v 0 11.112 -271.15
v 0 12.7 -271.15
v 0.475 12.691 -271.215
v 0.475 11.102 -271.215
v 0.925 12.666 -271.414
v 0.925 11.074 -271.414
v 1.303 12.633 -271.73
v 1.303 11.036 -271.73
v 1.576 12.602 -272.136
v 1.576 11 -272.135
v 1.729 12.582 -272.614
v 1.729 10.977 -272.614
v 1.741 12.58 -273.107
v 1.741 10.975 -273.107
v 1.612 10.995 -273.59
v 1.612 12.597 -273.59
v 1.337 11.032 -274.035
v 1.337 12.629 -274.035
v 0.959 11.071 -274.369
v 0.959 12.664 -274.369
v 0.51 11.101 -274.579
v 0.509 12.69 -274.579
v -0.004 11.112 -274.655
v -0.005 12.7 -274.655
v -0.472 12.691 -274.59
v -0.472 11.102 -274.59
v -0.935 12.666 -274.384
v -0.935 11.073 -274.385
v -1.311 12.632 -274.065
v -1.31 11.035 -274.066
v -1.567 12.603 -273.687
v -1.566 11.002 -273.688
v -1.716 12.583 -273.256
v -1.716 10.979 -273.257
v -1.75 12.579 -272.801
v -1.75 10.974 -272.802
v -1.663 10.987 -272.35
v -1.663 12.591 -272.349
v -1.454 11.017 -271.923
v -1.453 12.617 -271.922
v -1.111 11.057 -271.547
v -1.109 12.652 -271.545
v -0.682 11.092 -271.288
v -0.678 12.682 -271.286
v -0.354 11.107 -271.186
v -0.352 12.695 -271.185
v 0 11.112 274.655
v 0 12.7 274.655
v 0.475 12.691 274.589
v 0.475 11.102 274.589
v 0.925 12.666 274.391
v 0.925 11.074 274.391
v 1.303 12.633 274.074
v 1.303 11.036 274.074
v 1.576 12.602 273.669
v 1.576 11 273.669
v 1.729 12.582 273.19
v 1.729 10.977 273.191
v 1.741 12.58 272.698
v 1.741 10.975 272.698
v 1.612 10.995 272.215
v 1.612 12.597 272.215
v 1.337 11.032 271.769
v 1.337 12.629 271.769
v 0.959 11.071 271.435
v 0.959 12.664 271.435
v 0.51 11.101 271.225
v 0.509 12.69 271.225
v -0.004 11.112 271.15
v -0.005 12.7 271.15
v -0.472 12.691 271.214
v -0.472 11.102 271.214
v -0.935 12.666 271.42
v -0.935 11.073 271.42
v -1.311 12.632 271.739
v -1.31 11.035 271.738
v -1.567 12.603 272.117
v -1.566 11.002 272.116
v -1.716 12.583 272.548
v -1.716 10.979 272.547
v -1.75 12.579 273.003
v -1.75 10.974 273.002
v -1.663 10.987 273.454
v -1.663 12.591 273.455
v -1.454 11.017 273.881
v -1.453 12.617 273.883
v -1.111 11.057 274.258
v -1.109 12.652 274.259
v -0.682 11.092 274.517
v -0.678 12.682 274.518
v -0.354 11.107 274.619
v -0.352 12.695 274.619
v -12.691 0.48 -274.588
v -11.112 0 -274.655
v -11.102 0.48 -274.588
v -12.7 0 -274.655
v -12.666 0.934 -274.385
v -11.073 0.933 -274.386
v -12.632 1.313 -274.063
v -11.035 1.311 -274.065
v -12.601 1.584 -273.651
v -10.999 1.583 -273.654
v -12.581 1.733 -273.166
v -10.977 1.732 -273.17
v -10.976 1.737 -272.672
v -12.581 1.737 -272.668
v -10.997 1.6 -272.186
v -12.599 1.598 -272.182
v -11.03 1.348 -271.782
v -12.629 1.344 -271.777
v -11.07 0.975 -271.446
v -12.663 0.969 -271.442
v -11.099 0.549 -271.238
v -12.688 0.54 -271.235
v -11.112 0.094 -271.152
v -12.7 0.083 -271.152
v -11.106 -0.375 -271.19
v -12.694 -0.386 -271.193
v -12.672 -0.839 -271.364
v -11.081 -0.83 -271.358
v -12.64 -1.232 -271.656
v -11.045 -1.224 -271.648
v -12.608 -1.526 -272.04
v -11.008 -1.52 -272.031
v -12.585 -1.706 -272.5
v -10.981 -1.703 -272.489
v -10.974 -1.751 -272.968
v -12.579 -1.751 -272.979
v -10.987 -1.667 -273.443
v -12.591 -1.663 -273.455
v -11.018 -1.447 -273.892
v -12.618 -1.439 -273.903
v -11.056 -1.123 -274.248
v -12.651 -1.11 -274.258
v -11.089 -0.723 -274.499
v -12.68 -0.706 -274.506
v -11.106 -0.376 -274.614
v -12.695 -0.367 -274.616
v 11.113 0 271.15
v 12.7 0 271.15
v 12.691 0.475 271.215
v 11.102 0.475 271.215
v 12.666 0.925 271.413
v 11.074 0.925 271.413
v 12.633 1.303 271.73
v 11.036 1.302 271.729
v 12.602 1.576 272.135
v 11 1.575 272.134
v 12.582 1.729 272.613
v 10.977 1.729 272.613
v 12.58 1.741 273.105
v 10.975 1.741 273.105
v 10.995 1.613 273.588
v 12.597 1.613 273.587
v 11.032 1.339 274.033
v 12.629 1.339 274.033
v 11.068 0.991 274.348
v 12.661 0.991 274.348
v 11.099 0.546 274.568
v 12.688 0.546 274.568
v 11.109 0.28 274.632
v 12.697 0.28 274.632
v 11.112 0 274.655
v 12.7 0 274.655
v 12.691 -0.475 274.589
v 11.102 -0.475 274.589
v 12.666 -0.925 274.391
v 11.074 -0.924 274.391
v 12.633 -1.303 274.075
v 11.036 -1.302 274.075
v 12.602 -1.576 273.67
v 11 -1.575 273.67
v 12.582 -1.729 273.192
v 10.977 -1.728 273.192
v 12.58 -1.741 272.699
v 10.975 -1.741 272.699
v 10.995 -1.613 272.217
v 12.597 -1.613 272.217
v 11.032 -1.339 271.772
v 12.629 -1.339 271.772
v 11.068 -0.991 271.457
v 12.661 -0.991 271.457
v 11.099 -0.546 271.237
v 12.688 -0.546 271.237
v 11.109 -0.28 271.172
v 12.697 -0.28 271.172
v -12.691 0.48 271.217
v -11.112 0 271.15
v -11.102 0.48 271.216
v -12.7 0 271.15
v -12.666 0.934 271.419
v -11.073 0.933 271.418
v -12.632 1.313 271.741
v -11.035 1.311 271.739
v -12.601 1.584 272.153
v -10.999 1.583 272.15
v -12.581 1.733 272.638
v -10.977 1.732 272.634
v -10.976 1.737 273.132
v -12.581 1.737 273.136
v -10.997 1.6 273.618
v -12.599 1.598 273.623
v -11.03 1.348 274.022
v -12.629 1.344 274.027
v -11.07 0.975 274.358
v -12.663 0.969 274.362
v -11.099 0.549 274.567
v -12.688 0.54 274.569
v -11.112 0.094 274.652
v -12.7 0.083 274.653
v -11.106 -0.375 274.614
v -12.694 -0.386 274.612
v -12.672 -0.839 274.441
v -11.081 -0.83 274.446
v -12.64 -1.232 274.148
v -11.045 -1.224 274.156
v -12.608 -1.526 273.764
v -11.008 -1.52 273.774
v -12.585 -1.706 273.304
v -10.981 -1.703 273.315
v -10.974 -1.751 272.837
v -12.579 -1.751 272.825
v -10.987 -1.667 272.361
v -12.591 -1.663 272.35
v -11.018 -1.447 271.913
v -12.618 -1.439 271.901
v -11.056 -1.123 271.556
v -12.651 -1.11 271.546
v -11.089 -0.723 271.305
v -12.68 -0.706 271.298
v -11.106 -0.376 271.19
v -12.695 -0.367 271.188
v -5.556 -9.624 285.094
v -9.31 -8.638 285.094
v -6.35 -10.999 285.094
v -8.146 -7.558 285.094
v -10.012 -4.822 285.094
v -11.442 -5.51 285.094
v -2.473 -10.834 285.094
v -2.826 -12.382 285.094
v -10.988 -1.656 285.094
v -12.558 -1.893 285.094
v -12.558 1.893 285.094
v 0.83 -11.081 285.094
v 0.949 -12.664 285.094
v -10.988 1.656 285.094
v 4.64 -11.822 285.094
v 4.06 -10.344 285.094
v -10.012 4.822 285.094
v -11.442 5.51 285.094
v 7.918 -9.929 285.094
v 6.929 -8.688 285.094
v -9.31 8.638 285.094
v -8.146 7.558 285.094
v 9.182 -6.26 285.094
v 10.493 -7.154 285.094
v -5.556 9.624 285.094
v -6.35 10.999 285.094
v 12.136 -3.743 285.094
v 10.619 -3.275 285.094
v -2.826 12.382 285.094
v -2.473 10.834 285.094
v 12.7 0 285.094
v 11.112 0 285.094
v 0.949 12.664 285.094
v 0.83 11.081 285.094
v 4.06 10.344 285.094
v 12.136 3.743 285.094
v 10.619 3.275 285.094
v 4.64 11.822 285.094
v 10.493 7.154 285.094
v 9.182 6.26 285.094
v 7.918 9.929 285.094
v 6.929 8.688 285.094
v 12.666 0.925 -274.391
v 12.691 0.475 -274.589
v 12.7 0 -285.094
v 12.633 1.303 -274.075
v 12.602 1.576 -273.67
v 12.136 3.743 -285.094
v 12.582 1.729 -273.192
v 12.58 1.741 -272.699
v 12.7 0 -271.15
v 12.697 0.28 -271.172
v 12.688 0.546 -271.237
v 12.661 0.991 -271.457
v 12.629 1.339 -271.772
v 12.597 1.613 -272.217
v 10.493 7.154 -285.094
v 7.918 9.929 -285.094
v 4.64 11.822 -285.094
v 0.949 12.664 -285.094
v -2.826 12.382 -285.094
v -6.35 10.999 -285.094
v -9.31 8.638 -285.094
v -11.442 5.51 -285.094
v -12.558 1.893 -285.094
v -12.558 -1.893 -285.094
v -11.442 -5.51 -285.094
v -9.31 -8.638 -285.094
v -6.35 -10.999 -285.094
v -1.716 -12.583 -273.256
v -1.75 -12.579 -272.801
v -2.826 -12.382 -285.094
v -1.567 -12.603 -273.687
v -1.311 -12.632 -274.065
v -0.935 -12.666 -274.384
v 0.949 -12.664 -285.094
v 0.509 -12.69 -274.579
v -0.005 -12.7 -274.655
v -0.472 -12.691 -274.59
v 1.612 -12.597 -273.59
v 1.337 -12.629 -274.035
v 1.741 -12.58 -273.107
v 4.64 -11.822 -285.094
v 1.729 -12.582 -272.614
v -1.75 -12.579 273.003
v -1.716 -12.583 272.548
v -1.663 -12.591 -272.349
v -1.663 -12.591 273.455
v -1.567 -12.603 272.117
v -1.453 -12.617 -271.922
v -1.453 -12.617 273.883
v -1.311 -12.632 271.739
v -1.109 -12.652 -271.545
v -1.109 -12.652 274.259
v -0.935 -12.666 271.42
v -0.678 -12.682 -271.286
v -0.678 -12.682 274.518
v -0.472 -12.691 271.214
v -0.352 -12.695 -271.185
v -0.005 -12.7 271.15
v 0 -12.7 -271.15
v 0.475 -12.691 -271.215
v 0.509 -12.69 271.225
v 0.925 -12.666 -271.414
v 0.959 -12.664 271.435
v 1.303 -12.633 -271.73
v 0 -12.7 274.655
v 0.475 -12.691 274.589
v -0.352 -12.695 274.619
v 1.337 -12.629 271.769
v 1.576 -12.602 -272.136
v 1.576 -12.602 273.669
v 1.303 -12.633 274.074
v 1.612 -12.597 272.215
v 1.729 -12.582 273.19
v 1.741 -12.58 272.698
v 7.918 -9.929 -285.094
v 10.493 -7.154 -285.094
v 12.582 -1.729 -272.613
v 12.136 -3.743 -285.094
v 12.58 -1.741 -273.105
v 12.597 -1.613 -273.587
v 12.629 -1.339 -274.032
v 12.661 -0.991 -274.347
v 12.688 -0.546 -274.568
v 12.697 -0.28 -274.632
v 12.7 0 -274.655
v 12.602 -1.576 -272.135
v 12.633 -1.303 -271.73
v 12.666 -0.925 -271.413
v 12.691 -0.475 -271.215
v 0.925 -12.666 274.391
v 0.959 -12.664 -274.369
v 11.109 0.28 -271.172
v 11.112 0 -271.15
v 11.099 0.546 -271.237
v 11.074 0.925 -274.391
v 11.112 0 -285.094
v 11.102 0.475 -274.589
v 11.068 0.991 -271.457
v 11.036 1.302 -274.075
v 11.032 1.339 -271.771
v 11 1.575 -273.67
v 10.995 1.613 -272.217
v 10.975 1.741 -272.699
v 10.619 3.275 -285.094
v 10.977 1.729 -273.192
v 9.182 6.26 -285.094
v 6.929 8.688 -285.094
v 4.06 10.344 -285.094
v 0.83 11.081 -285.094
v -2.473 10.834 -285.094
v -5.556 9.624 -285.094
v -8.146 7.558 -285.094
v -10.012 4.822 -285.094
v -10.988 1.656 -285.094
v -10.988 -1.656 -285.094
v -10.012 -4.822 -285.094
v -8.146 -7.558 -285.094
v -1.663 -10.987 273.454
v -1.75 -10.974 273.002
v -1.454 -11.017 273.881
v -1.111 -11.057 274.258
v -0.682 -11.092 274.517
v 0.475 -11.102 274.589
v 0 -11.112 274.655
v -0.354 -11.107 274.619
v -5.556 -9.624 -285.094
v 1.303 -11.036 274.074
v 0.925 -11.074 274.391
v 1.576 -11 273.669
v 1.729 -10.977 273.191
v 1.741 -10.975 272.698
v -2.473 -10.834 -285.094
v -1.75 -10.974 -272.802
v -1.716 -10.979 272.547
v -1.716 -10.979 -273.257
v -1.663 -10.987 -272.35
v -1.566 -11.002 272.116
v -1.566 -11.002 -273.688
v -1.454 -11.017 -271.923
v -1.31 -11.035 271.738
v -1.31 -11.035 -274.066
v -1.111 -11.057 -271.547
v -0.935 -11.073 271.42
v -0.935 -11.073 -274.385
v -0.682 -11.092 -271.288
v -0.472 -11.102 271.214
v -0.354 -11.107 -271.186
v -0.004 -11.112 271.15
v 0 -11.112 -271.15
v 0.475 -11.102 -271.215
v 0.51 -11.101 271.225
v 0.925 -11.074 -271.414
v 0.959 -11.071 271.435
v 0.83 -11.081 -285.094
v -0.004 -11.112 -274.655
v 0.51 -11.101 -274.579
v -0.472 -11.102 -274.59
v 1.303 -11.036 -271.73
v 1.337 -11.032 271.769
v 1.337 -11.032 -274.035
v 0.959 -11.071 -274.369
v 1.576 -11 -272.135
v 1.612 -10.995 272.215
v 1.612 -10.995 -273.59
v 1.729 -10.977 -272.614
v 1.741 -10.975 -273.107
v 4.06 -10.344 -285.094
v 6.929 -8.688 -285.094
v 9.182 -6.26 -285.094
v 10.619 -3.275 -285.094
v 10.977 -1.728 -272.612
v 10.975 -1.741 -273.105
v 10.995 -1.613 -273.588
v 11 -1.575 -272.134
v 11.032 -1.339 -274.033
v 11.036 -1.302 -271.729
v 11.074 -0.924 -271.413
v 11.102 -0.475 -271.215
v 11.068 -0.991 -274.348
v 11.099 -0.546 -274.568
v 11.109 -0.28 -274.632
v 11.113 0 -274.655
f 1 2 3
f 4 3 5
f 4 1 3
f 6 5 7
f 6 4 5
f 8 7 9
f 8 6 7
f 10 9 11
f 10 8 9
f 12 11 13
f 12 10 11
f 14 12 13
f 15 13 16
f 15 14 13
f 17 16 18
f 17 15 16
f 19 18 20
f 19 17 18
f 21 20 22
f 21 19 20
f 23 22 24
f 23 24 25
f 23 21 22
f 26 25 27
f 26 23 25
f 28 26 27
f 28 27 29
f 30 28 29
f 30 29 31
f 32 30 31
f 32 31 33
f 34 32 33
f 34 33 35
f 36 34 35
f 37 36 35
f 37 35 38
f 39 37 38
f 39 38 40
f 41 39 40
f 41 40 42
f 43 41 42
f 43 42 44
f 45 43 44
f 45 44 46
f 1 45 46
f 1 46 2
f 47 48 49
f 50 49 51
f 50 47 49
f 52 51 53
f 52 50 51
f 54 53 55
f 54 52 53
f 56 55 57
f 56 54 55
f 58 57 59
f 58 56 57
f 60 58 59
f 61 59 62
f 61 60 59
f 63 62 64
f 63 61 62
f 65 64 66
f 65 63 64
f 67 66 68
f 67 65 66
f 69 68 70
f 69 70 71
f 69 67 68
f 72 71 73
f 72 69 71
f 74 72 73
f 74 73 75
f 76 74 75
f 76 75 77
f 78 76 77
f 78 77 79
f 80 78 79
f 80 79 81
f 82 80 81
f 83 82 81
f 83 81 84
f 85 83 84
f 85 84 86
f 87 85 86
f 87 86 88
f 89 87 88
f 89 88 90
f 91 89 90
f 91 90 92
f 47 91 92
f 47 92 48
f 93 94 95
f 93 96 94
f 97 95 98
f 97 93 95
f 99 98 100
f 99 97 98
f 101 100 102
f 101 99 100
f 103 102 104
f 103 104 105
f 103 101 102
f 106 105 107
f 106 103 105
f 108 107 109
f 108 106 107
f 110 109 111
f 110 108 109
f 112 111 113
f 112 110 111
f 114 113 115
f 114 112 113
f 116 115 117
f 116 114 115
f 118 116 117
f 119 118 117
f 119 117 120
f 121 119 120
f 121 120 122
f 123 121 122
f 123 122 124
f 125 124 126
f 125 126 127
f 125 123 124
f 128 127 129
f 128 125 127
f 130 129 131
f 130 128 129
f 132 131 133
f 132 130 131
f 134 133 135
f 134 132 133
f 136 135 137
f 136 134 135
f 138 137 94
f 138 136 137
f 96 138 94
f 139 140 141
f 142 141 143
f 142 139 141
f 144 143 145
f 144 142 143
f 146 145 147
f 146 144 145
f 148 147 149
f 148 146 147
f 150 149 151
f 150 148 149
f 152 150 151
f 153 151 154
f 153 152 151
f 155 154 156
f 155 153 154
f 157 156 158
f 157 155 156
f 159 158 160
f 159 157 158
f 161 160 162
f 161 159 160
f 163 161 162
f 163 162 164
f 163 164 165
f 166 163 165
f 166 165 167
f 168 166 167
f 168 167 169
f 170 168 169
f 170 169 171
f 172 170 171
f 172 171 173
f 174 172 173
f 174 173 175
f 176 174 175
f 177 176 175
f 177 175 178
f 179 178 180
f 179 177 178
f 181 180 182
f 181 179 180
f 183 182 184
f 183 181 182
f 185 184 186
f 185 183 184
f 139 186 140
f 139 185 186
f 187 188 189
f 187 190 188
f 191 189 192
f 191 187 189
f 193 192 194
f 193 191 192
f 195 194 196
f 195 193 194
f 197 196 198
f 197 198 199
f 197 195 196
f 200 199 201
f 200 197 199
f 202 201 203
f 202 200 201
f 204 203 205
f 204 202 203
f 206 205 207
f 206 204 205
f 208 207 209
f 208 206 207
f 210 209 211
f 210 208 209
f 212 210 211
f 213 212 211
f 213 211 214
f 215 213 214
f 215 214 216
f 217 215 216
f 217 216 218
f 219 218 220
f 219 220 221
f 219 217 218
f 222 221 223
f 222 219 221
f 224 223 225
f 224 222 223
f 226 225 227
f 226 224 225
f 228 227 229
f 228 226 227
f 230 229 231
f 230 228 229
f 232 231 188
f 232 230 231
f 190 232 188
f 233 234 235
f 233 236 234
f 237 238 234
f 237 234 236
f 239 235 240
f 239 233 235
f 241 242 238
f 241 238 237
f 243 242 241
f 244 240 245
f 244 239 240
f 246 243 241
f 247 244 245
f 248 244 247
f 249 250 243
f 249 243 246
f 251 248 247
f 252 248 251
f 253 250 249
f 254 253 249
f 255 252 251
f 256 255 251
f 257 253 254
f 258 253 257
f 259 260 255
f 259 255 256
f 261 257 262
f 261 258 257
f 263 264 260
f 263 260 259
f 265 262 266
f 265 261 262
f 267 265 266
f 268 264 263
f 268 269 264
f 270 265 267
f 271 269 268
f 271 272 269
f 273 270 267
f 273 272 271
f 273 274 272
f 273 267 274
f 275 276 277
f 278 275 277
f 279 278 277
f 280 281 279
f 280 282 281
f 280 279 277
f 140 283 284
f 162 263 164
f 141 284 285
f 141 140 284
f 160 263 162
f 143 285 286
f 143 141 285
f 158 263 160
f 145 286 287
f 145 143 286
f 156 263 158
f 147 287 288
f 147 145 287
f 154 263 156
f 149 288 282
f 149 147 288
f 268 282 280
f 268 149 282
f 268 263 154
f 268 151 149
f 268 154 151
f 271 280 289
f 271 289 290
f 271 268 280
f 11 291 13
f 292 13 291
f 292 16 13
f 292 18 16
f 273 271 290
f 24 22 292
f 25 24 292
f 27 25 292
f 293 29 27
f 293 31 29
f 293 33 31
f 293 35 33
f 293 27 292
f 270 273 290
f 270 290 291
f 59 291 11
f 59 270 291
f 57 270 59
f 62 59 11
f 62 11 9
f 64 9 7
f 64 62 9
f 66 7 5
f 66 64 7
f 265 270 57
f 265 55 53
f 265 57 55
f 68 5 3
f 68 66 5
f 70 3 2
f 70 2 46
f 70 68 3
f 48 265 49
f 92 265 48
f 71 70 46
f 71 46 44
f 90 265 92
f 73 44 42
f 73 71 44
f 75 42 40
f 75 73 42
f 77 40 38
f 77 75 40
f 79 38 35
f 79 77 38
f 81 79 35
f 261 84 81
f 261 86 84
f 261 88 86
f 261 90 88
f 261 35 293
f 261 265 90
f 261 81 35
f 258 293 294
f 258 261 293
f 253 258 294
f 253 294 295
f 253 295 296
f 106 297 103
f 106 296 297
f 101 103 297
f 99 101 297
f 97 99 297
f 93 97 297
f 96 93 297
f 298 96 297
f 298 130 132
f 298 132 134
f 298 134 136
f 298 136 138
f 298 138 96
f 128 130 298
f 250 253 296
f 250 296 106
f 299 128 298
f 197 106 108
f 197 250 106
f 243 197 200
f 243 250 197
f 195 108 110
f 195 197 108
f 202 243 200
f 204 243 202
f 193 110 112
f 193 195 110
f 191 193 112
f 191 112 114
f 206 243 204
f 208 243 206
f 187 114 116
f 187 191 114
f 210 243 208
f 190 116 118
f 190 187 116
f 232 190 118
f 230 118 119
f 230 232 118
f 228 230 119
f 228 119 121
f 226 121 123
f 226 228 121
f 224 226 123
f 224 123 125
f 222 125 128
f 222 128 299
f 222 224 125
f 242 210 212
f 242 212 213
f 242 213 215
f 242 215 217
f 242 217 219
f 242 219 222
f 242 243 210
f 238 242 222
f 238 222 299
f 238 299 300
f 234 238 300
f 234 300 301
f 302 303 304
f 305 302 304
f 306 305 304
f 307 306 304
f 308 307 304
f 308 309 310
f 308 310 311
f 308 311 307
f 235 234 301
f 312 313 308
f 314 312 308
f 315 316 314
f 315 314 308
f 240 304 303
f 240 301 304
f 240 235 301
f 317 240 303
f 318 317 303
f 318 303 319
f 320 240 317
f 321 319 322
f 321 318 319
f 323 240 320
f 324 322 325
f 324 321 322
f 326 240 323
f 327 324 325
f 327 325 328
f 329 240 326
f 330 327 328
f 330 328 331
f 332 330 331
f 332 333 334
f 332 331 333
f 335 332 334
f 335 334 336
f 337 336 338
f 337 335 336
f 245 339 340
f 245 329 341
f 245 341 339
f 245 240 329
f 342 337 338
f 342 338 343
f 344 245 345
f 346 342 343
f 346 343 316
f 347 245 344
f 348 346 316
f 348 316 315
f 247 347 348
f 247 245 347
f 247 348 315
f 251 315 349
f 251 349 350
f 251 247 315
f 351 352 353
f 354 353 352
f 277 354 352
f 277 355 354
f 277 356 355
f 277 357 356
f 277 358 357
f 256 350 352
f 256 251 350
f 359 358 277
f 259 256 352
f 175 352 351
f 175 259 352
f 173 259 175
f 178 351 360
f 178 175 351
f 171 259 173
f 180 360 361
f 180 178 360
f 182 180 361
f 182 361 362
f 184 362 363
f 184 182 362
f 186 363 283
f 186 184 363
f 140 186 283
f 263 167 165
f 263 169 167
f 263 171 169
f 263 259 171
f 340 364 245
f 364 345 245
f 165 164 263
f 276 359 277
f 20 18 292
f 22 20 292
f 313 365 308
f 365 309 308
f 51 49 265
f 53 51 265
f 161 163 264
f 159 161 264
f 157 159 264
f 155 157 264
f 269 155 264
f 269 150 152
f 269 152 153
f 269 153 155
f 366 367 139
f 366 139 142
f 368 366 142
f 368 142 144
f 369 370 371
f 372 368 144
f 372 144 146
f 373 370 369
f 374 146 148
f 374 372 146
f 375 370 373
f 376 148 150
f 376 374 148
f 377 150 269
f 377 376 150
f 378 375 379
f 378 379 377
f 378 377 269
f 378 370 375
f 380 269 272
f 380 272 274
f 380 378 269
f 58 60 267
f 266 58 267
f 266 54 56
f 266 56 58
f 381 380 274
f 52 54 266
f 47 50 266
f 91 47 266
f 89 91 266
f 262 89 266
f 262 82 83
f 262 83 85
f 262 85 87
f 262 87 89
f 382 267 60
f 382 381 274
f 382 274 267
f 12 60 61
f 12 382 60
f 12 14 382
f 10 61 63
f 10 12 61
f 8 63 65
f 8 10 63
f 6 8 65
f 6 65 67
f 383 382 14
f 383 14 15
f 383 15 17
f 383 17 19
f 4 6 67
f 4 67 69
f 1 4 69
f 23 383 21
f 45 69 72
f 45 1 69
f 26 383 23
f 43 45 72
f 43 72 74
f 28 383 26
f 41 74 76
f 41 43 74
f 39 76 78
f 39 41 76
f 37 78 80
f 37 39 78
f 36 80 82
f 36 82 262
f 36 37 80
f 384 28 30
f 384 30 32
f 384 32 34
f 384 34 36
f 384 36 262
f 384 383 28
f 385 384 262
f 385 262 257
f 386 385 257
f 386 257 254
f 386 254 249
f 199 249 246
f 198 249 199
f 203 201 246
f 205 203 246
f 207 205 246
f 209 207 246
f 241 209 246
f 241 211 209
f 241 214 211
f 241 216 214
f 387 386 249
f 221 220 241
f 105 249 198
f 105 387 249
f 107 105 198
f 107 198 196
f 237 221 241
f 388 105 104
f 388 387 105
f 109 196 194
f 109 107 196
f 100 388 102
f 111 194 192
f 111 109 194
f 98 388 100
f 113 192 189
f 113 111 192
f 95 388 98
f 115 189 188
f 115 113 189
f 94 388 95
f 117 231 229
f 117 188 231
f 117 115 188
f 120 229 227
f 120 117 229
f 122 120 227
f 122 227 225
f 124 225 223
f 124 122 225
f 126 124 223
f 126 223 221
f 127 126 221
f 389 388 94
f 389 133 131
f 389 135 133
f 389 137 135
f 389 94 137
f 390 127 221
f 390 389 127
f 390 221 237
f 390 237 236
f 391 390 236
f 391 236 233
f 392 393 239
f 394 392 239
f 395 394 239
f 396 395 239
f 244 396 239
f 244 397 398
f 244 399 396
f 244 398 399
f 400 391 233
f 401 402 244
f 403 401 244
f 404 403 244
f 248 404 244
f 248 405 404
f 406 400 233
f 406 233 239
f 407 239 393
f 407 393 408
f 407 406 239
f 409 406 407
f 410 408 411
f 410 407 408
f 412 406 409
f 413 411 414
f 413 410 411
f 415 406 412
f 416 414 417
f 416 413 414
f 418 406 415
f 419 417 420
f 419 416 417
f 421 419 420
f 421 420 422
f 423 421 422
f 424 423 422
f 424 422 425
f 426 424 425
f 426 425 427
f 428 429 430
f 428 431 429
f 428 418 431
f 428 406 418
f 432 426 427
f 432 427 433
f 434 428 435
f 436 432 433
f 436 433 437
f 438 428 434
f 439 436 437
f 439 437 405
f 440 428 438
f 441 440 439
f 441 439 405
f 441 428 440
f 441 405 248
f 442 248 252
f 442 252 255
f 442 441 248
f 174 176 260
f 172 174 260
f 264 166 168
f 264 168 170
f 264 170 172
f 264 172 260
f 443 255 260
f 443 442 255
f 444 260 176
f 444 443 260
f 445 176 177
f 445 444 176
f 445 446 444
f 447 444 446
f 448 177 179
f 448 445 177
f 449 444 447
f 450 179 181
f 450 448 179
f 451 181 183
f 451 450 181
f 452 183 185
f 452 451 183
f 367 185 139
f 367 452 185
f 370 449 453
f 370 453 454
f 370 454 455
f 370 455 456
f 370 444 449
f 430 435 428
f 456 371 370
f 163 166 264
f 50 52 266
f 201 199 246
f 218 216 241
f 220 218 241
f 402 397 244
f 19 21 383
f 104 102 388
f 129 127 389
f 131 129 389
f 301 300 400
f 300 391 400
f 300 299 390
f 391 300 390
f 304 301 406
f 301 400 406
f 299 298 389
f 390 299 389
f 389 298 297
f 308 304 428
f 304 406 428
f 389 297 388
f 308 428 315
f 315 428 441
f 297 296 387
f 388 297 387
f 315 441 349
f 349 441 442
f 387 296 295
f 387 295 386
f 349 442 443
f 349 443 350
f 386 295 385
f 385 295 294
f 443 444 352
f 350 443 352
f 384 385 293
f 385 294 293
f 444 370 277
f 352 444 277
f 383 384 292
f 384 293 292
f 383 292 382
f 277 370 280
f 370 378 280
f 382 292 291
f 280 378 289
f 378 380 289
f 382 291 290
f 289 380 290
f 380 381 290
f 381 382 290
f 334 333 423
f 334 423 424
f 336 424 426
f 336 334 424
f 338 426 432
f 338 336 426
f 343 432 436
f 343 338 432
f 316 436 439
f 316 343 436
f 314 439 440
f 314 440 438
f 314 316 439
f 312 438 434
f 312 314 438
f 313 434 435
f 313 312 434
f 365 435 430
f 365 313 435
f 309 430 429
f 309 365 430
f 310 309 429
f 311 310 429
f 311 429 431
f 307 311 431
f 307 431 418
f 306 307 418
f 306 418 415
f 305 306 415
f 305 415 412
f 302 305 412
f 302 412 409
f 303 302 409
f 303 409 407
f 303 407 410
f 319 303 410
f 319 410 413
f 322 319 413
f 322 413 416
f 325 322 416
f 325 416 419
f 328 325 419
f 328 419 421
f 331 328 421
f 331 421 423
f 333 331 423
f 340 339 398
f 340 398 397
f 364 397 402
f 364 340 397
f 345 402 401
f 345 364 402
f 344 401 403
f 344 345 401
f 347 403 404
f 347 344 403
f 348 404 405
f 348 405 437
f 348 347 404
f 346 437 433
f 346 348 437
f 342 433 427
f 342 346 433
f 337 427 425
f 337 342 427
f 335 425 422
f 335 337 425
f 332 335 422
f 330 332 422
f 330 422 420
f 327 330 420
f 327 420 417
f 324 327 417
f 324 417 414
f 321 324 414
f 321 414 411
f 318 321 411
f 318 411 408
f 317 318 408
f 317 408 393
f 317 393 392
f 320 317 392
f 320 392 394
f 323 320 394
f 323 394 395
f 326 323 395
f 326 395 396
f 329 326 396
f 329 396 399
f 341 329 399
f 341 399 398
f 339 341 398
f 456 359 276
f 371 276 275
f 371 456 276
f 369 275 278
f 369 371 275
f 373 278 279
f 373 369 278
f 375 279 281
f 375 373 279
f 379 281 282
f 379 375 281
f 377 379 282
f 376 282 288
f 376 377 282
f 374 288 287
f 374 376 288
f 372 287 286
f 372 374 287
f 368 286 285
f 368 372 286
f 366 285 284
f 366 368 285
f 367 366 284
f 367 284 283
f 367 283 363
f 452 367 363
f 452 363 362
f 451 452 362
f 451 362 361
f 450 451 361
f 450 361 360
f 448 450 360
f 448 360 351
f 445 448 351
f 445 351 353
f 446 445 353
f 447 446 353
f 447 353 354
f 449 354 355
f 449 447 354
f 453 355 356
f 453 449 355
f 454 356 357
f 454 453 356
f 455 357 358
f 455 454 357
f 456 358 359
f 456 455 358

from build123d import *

# Parameters (mm, degrees)
SKETCH2_R               = 12.7
SKETCH2_R_2             = 11.1125
BOSS_EXTRUDE1_DEPTH     = 285.09415041
CUT_EXTRUDE1_DEPTH      = 286.659333119
CUT_EXTRUDE1_DEPTH_BACK = 286.659333119
SKETCH3_R               = 1.7526
CUT_EXTRUDE2_DEPTH      = 286.659333228
CUT_EXTRUDE2_DEPTH_BACK = 286.659333228
SKETCH4_R               = 1.7526


with BuildPart() as part:
    # Sketch2 → Boss-Extrude1 (new, symmetric)
    with BuildSketch(Plane.XY):
        Circle(SKETCH2_R)
        Circle(SKETCH2_R_2, mode=Mode.SUBTRACT)
    extrude(amount=BOSS_EXTRUDE1_DEPTH, both=True)

    # Sketch3 → Cut-Extrude1 (cut, two sides: drawn at the far end of the back side and taken through both)
    with BuildSketch(Plane(origin=(0, 0, 0), x_dir=(1, 0, 0), z_dir=(0, 1, 0)).offset(-CUT_EXTRUDE1_DEPTH_BACK)):
        with Locations(Location((0, -272.90215041, 0), (0, 0, 270))):
            Circle(SKETCH3_R)
        with Locations(Location((0, 272.90215041, 0), (0, 0, 270))):
            Circle(SKETCH3_R)
    extrude(amount=CUT_EXTRUDE1_DEPTH + CUT_EXTRUDE1_DEPTH_BACK, mode=Mode.SUBTRACT)

    # Sketch4 → Cut-Extrude2 (cut, two sides: drawn at the far end of the back side and taken through both)
    with BuildSketch(Plane(origin=(0, 0, 0), x_dir=(0, 0, -1), z_dir=(1, 0, 0)).offset(-CUT_EXTRUDE2_DEPTH_BACK)):
        with Locations((-272.90215041, 0)):
            Circle(SKETCH4_R)
        with Locations((272.90215041, 0)):
            Circle(SKETCH4_R)
    extrude(amount=CUT_EXTRUDE2_DEPTH + CUT_EXTRUDE2_DEPTH_BACK, mode=Mode.SUBTRACT)


solid = part.part
